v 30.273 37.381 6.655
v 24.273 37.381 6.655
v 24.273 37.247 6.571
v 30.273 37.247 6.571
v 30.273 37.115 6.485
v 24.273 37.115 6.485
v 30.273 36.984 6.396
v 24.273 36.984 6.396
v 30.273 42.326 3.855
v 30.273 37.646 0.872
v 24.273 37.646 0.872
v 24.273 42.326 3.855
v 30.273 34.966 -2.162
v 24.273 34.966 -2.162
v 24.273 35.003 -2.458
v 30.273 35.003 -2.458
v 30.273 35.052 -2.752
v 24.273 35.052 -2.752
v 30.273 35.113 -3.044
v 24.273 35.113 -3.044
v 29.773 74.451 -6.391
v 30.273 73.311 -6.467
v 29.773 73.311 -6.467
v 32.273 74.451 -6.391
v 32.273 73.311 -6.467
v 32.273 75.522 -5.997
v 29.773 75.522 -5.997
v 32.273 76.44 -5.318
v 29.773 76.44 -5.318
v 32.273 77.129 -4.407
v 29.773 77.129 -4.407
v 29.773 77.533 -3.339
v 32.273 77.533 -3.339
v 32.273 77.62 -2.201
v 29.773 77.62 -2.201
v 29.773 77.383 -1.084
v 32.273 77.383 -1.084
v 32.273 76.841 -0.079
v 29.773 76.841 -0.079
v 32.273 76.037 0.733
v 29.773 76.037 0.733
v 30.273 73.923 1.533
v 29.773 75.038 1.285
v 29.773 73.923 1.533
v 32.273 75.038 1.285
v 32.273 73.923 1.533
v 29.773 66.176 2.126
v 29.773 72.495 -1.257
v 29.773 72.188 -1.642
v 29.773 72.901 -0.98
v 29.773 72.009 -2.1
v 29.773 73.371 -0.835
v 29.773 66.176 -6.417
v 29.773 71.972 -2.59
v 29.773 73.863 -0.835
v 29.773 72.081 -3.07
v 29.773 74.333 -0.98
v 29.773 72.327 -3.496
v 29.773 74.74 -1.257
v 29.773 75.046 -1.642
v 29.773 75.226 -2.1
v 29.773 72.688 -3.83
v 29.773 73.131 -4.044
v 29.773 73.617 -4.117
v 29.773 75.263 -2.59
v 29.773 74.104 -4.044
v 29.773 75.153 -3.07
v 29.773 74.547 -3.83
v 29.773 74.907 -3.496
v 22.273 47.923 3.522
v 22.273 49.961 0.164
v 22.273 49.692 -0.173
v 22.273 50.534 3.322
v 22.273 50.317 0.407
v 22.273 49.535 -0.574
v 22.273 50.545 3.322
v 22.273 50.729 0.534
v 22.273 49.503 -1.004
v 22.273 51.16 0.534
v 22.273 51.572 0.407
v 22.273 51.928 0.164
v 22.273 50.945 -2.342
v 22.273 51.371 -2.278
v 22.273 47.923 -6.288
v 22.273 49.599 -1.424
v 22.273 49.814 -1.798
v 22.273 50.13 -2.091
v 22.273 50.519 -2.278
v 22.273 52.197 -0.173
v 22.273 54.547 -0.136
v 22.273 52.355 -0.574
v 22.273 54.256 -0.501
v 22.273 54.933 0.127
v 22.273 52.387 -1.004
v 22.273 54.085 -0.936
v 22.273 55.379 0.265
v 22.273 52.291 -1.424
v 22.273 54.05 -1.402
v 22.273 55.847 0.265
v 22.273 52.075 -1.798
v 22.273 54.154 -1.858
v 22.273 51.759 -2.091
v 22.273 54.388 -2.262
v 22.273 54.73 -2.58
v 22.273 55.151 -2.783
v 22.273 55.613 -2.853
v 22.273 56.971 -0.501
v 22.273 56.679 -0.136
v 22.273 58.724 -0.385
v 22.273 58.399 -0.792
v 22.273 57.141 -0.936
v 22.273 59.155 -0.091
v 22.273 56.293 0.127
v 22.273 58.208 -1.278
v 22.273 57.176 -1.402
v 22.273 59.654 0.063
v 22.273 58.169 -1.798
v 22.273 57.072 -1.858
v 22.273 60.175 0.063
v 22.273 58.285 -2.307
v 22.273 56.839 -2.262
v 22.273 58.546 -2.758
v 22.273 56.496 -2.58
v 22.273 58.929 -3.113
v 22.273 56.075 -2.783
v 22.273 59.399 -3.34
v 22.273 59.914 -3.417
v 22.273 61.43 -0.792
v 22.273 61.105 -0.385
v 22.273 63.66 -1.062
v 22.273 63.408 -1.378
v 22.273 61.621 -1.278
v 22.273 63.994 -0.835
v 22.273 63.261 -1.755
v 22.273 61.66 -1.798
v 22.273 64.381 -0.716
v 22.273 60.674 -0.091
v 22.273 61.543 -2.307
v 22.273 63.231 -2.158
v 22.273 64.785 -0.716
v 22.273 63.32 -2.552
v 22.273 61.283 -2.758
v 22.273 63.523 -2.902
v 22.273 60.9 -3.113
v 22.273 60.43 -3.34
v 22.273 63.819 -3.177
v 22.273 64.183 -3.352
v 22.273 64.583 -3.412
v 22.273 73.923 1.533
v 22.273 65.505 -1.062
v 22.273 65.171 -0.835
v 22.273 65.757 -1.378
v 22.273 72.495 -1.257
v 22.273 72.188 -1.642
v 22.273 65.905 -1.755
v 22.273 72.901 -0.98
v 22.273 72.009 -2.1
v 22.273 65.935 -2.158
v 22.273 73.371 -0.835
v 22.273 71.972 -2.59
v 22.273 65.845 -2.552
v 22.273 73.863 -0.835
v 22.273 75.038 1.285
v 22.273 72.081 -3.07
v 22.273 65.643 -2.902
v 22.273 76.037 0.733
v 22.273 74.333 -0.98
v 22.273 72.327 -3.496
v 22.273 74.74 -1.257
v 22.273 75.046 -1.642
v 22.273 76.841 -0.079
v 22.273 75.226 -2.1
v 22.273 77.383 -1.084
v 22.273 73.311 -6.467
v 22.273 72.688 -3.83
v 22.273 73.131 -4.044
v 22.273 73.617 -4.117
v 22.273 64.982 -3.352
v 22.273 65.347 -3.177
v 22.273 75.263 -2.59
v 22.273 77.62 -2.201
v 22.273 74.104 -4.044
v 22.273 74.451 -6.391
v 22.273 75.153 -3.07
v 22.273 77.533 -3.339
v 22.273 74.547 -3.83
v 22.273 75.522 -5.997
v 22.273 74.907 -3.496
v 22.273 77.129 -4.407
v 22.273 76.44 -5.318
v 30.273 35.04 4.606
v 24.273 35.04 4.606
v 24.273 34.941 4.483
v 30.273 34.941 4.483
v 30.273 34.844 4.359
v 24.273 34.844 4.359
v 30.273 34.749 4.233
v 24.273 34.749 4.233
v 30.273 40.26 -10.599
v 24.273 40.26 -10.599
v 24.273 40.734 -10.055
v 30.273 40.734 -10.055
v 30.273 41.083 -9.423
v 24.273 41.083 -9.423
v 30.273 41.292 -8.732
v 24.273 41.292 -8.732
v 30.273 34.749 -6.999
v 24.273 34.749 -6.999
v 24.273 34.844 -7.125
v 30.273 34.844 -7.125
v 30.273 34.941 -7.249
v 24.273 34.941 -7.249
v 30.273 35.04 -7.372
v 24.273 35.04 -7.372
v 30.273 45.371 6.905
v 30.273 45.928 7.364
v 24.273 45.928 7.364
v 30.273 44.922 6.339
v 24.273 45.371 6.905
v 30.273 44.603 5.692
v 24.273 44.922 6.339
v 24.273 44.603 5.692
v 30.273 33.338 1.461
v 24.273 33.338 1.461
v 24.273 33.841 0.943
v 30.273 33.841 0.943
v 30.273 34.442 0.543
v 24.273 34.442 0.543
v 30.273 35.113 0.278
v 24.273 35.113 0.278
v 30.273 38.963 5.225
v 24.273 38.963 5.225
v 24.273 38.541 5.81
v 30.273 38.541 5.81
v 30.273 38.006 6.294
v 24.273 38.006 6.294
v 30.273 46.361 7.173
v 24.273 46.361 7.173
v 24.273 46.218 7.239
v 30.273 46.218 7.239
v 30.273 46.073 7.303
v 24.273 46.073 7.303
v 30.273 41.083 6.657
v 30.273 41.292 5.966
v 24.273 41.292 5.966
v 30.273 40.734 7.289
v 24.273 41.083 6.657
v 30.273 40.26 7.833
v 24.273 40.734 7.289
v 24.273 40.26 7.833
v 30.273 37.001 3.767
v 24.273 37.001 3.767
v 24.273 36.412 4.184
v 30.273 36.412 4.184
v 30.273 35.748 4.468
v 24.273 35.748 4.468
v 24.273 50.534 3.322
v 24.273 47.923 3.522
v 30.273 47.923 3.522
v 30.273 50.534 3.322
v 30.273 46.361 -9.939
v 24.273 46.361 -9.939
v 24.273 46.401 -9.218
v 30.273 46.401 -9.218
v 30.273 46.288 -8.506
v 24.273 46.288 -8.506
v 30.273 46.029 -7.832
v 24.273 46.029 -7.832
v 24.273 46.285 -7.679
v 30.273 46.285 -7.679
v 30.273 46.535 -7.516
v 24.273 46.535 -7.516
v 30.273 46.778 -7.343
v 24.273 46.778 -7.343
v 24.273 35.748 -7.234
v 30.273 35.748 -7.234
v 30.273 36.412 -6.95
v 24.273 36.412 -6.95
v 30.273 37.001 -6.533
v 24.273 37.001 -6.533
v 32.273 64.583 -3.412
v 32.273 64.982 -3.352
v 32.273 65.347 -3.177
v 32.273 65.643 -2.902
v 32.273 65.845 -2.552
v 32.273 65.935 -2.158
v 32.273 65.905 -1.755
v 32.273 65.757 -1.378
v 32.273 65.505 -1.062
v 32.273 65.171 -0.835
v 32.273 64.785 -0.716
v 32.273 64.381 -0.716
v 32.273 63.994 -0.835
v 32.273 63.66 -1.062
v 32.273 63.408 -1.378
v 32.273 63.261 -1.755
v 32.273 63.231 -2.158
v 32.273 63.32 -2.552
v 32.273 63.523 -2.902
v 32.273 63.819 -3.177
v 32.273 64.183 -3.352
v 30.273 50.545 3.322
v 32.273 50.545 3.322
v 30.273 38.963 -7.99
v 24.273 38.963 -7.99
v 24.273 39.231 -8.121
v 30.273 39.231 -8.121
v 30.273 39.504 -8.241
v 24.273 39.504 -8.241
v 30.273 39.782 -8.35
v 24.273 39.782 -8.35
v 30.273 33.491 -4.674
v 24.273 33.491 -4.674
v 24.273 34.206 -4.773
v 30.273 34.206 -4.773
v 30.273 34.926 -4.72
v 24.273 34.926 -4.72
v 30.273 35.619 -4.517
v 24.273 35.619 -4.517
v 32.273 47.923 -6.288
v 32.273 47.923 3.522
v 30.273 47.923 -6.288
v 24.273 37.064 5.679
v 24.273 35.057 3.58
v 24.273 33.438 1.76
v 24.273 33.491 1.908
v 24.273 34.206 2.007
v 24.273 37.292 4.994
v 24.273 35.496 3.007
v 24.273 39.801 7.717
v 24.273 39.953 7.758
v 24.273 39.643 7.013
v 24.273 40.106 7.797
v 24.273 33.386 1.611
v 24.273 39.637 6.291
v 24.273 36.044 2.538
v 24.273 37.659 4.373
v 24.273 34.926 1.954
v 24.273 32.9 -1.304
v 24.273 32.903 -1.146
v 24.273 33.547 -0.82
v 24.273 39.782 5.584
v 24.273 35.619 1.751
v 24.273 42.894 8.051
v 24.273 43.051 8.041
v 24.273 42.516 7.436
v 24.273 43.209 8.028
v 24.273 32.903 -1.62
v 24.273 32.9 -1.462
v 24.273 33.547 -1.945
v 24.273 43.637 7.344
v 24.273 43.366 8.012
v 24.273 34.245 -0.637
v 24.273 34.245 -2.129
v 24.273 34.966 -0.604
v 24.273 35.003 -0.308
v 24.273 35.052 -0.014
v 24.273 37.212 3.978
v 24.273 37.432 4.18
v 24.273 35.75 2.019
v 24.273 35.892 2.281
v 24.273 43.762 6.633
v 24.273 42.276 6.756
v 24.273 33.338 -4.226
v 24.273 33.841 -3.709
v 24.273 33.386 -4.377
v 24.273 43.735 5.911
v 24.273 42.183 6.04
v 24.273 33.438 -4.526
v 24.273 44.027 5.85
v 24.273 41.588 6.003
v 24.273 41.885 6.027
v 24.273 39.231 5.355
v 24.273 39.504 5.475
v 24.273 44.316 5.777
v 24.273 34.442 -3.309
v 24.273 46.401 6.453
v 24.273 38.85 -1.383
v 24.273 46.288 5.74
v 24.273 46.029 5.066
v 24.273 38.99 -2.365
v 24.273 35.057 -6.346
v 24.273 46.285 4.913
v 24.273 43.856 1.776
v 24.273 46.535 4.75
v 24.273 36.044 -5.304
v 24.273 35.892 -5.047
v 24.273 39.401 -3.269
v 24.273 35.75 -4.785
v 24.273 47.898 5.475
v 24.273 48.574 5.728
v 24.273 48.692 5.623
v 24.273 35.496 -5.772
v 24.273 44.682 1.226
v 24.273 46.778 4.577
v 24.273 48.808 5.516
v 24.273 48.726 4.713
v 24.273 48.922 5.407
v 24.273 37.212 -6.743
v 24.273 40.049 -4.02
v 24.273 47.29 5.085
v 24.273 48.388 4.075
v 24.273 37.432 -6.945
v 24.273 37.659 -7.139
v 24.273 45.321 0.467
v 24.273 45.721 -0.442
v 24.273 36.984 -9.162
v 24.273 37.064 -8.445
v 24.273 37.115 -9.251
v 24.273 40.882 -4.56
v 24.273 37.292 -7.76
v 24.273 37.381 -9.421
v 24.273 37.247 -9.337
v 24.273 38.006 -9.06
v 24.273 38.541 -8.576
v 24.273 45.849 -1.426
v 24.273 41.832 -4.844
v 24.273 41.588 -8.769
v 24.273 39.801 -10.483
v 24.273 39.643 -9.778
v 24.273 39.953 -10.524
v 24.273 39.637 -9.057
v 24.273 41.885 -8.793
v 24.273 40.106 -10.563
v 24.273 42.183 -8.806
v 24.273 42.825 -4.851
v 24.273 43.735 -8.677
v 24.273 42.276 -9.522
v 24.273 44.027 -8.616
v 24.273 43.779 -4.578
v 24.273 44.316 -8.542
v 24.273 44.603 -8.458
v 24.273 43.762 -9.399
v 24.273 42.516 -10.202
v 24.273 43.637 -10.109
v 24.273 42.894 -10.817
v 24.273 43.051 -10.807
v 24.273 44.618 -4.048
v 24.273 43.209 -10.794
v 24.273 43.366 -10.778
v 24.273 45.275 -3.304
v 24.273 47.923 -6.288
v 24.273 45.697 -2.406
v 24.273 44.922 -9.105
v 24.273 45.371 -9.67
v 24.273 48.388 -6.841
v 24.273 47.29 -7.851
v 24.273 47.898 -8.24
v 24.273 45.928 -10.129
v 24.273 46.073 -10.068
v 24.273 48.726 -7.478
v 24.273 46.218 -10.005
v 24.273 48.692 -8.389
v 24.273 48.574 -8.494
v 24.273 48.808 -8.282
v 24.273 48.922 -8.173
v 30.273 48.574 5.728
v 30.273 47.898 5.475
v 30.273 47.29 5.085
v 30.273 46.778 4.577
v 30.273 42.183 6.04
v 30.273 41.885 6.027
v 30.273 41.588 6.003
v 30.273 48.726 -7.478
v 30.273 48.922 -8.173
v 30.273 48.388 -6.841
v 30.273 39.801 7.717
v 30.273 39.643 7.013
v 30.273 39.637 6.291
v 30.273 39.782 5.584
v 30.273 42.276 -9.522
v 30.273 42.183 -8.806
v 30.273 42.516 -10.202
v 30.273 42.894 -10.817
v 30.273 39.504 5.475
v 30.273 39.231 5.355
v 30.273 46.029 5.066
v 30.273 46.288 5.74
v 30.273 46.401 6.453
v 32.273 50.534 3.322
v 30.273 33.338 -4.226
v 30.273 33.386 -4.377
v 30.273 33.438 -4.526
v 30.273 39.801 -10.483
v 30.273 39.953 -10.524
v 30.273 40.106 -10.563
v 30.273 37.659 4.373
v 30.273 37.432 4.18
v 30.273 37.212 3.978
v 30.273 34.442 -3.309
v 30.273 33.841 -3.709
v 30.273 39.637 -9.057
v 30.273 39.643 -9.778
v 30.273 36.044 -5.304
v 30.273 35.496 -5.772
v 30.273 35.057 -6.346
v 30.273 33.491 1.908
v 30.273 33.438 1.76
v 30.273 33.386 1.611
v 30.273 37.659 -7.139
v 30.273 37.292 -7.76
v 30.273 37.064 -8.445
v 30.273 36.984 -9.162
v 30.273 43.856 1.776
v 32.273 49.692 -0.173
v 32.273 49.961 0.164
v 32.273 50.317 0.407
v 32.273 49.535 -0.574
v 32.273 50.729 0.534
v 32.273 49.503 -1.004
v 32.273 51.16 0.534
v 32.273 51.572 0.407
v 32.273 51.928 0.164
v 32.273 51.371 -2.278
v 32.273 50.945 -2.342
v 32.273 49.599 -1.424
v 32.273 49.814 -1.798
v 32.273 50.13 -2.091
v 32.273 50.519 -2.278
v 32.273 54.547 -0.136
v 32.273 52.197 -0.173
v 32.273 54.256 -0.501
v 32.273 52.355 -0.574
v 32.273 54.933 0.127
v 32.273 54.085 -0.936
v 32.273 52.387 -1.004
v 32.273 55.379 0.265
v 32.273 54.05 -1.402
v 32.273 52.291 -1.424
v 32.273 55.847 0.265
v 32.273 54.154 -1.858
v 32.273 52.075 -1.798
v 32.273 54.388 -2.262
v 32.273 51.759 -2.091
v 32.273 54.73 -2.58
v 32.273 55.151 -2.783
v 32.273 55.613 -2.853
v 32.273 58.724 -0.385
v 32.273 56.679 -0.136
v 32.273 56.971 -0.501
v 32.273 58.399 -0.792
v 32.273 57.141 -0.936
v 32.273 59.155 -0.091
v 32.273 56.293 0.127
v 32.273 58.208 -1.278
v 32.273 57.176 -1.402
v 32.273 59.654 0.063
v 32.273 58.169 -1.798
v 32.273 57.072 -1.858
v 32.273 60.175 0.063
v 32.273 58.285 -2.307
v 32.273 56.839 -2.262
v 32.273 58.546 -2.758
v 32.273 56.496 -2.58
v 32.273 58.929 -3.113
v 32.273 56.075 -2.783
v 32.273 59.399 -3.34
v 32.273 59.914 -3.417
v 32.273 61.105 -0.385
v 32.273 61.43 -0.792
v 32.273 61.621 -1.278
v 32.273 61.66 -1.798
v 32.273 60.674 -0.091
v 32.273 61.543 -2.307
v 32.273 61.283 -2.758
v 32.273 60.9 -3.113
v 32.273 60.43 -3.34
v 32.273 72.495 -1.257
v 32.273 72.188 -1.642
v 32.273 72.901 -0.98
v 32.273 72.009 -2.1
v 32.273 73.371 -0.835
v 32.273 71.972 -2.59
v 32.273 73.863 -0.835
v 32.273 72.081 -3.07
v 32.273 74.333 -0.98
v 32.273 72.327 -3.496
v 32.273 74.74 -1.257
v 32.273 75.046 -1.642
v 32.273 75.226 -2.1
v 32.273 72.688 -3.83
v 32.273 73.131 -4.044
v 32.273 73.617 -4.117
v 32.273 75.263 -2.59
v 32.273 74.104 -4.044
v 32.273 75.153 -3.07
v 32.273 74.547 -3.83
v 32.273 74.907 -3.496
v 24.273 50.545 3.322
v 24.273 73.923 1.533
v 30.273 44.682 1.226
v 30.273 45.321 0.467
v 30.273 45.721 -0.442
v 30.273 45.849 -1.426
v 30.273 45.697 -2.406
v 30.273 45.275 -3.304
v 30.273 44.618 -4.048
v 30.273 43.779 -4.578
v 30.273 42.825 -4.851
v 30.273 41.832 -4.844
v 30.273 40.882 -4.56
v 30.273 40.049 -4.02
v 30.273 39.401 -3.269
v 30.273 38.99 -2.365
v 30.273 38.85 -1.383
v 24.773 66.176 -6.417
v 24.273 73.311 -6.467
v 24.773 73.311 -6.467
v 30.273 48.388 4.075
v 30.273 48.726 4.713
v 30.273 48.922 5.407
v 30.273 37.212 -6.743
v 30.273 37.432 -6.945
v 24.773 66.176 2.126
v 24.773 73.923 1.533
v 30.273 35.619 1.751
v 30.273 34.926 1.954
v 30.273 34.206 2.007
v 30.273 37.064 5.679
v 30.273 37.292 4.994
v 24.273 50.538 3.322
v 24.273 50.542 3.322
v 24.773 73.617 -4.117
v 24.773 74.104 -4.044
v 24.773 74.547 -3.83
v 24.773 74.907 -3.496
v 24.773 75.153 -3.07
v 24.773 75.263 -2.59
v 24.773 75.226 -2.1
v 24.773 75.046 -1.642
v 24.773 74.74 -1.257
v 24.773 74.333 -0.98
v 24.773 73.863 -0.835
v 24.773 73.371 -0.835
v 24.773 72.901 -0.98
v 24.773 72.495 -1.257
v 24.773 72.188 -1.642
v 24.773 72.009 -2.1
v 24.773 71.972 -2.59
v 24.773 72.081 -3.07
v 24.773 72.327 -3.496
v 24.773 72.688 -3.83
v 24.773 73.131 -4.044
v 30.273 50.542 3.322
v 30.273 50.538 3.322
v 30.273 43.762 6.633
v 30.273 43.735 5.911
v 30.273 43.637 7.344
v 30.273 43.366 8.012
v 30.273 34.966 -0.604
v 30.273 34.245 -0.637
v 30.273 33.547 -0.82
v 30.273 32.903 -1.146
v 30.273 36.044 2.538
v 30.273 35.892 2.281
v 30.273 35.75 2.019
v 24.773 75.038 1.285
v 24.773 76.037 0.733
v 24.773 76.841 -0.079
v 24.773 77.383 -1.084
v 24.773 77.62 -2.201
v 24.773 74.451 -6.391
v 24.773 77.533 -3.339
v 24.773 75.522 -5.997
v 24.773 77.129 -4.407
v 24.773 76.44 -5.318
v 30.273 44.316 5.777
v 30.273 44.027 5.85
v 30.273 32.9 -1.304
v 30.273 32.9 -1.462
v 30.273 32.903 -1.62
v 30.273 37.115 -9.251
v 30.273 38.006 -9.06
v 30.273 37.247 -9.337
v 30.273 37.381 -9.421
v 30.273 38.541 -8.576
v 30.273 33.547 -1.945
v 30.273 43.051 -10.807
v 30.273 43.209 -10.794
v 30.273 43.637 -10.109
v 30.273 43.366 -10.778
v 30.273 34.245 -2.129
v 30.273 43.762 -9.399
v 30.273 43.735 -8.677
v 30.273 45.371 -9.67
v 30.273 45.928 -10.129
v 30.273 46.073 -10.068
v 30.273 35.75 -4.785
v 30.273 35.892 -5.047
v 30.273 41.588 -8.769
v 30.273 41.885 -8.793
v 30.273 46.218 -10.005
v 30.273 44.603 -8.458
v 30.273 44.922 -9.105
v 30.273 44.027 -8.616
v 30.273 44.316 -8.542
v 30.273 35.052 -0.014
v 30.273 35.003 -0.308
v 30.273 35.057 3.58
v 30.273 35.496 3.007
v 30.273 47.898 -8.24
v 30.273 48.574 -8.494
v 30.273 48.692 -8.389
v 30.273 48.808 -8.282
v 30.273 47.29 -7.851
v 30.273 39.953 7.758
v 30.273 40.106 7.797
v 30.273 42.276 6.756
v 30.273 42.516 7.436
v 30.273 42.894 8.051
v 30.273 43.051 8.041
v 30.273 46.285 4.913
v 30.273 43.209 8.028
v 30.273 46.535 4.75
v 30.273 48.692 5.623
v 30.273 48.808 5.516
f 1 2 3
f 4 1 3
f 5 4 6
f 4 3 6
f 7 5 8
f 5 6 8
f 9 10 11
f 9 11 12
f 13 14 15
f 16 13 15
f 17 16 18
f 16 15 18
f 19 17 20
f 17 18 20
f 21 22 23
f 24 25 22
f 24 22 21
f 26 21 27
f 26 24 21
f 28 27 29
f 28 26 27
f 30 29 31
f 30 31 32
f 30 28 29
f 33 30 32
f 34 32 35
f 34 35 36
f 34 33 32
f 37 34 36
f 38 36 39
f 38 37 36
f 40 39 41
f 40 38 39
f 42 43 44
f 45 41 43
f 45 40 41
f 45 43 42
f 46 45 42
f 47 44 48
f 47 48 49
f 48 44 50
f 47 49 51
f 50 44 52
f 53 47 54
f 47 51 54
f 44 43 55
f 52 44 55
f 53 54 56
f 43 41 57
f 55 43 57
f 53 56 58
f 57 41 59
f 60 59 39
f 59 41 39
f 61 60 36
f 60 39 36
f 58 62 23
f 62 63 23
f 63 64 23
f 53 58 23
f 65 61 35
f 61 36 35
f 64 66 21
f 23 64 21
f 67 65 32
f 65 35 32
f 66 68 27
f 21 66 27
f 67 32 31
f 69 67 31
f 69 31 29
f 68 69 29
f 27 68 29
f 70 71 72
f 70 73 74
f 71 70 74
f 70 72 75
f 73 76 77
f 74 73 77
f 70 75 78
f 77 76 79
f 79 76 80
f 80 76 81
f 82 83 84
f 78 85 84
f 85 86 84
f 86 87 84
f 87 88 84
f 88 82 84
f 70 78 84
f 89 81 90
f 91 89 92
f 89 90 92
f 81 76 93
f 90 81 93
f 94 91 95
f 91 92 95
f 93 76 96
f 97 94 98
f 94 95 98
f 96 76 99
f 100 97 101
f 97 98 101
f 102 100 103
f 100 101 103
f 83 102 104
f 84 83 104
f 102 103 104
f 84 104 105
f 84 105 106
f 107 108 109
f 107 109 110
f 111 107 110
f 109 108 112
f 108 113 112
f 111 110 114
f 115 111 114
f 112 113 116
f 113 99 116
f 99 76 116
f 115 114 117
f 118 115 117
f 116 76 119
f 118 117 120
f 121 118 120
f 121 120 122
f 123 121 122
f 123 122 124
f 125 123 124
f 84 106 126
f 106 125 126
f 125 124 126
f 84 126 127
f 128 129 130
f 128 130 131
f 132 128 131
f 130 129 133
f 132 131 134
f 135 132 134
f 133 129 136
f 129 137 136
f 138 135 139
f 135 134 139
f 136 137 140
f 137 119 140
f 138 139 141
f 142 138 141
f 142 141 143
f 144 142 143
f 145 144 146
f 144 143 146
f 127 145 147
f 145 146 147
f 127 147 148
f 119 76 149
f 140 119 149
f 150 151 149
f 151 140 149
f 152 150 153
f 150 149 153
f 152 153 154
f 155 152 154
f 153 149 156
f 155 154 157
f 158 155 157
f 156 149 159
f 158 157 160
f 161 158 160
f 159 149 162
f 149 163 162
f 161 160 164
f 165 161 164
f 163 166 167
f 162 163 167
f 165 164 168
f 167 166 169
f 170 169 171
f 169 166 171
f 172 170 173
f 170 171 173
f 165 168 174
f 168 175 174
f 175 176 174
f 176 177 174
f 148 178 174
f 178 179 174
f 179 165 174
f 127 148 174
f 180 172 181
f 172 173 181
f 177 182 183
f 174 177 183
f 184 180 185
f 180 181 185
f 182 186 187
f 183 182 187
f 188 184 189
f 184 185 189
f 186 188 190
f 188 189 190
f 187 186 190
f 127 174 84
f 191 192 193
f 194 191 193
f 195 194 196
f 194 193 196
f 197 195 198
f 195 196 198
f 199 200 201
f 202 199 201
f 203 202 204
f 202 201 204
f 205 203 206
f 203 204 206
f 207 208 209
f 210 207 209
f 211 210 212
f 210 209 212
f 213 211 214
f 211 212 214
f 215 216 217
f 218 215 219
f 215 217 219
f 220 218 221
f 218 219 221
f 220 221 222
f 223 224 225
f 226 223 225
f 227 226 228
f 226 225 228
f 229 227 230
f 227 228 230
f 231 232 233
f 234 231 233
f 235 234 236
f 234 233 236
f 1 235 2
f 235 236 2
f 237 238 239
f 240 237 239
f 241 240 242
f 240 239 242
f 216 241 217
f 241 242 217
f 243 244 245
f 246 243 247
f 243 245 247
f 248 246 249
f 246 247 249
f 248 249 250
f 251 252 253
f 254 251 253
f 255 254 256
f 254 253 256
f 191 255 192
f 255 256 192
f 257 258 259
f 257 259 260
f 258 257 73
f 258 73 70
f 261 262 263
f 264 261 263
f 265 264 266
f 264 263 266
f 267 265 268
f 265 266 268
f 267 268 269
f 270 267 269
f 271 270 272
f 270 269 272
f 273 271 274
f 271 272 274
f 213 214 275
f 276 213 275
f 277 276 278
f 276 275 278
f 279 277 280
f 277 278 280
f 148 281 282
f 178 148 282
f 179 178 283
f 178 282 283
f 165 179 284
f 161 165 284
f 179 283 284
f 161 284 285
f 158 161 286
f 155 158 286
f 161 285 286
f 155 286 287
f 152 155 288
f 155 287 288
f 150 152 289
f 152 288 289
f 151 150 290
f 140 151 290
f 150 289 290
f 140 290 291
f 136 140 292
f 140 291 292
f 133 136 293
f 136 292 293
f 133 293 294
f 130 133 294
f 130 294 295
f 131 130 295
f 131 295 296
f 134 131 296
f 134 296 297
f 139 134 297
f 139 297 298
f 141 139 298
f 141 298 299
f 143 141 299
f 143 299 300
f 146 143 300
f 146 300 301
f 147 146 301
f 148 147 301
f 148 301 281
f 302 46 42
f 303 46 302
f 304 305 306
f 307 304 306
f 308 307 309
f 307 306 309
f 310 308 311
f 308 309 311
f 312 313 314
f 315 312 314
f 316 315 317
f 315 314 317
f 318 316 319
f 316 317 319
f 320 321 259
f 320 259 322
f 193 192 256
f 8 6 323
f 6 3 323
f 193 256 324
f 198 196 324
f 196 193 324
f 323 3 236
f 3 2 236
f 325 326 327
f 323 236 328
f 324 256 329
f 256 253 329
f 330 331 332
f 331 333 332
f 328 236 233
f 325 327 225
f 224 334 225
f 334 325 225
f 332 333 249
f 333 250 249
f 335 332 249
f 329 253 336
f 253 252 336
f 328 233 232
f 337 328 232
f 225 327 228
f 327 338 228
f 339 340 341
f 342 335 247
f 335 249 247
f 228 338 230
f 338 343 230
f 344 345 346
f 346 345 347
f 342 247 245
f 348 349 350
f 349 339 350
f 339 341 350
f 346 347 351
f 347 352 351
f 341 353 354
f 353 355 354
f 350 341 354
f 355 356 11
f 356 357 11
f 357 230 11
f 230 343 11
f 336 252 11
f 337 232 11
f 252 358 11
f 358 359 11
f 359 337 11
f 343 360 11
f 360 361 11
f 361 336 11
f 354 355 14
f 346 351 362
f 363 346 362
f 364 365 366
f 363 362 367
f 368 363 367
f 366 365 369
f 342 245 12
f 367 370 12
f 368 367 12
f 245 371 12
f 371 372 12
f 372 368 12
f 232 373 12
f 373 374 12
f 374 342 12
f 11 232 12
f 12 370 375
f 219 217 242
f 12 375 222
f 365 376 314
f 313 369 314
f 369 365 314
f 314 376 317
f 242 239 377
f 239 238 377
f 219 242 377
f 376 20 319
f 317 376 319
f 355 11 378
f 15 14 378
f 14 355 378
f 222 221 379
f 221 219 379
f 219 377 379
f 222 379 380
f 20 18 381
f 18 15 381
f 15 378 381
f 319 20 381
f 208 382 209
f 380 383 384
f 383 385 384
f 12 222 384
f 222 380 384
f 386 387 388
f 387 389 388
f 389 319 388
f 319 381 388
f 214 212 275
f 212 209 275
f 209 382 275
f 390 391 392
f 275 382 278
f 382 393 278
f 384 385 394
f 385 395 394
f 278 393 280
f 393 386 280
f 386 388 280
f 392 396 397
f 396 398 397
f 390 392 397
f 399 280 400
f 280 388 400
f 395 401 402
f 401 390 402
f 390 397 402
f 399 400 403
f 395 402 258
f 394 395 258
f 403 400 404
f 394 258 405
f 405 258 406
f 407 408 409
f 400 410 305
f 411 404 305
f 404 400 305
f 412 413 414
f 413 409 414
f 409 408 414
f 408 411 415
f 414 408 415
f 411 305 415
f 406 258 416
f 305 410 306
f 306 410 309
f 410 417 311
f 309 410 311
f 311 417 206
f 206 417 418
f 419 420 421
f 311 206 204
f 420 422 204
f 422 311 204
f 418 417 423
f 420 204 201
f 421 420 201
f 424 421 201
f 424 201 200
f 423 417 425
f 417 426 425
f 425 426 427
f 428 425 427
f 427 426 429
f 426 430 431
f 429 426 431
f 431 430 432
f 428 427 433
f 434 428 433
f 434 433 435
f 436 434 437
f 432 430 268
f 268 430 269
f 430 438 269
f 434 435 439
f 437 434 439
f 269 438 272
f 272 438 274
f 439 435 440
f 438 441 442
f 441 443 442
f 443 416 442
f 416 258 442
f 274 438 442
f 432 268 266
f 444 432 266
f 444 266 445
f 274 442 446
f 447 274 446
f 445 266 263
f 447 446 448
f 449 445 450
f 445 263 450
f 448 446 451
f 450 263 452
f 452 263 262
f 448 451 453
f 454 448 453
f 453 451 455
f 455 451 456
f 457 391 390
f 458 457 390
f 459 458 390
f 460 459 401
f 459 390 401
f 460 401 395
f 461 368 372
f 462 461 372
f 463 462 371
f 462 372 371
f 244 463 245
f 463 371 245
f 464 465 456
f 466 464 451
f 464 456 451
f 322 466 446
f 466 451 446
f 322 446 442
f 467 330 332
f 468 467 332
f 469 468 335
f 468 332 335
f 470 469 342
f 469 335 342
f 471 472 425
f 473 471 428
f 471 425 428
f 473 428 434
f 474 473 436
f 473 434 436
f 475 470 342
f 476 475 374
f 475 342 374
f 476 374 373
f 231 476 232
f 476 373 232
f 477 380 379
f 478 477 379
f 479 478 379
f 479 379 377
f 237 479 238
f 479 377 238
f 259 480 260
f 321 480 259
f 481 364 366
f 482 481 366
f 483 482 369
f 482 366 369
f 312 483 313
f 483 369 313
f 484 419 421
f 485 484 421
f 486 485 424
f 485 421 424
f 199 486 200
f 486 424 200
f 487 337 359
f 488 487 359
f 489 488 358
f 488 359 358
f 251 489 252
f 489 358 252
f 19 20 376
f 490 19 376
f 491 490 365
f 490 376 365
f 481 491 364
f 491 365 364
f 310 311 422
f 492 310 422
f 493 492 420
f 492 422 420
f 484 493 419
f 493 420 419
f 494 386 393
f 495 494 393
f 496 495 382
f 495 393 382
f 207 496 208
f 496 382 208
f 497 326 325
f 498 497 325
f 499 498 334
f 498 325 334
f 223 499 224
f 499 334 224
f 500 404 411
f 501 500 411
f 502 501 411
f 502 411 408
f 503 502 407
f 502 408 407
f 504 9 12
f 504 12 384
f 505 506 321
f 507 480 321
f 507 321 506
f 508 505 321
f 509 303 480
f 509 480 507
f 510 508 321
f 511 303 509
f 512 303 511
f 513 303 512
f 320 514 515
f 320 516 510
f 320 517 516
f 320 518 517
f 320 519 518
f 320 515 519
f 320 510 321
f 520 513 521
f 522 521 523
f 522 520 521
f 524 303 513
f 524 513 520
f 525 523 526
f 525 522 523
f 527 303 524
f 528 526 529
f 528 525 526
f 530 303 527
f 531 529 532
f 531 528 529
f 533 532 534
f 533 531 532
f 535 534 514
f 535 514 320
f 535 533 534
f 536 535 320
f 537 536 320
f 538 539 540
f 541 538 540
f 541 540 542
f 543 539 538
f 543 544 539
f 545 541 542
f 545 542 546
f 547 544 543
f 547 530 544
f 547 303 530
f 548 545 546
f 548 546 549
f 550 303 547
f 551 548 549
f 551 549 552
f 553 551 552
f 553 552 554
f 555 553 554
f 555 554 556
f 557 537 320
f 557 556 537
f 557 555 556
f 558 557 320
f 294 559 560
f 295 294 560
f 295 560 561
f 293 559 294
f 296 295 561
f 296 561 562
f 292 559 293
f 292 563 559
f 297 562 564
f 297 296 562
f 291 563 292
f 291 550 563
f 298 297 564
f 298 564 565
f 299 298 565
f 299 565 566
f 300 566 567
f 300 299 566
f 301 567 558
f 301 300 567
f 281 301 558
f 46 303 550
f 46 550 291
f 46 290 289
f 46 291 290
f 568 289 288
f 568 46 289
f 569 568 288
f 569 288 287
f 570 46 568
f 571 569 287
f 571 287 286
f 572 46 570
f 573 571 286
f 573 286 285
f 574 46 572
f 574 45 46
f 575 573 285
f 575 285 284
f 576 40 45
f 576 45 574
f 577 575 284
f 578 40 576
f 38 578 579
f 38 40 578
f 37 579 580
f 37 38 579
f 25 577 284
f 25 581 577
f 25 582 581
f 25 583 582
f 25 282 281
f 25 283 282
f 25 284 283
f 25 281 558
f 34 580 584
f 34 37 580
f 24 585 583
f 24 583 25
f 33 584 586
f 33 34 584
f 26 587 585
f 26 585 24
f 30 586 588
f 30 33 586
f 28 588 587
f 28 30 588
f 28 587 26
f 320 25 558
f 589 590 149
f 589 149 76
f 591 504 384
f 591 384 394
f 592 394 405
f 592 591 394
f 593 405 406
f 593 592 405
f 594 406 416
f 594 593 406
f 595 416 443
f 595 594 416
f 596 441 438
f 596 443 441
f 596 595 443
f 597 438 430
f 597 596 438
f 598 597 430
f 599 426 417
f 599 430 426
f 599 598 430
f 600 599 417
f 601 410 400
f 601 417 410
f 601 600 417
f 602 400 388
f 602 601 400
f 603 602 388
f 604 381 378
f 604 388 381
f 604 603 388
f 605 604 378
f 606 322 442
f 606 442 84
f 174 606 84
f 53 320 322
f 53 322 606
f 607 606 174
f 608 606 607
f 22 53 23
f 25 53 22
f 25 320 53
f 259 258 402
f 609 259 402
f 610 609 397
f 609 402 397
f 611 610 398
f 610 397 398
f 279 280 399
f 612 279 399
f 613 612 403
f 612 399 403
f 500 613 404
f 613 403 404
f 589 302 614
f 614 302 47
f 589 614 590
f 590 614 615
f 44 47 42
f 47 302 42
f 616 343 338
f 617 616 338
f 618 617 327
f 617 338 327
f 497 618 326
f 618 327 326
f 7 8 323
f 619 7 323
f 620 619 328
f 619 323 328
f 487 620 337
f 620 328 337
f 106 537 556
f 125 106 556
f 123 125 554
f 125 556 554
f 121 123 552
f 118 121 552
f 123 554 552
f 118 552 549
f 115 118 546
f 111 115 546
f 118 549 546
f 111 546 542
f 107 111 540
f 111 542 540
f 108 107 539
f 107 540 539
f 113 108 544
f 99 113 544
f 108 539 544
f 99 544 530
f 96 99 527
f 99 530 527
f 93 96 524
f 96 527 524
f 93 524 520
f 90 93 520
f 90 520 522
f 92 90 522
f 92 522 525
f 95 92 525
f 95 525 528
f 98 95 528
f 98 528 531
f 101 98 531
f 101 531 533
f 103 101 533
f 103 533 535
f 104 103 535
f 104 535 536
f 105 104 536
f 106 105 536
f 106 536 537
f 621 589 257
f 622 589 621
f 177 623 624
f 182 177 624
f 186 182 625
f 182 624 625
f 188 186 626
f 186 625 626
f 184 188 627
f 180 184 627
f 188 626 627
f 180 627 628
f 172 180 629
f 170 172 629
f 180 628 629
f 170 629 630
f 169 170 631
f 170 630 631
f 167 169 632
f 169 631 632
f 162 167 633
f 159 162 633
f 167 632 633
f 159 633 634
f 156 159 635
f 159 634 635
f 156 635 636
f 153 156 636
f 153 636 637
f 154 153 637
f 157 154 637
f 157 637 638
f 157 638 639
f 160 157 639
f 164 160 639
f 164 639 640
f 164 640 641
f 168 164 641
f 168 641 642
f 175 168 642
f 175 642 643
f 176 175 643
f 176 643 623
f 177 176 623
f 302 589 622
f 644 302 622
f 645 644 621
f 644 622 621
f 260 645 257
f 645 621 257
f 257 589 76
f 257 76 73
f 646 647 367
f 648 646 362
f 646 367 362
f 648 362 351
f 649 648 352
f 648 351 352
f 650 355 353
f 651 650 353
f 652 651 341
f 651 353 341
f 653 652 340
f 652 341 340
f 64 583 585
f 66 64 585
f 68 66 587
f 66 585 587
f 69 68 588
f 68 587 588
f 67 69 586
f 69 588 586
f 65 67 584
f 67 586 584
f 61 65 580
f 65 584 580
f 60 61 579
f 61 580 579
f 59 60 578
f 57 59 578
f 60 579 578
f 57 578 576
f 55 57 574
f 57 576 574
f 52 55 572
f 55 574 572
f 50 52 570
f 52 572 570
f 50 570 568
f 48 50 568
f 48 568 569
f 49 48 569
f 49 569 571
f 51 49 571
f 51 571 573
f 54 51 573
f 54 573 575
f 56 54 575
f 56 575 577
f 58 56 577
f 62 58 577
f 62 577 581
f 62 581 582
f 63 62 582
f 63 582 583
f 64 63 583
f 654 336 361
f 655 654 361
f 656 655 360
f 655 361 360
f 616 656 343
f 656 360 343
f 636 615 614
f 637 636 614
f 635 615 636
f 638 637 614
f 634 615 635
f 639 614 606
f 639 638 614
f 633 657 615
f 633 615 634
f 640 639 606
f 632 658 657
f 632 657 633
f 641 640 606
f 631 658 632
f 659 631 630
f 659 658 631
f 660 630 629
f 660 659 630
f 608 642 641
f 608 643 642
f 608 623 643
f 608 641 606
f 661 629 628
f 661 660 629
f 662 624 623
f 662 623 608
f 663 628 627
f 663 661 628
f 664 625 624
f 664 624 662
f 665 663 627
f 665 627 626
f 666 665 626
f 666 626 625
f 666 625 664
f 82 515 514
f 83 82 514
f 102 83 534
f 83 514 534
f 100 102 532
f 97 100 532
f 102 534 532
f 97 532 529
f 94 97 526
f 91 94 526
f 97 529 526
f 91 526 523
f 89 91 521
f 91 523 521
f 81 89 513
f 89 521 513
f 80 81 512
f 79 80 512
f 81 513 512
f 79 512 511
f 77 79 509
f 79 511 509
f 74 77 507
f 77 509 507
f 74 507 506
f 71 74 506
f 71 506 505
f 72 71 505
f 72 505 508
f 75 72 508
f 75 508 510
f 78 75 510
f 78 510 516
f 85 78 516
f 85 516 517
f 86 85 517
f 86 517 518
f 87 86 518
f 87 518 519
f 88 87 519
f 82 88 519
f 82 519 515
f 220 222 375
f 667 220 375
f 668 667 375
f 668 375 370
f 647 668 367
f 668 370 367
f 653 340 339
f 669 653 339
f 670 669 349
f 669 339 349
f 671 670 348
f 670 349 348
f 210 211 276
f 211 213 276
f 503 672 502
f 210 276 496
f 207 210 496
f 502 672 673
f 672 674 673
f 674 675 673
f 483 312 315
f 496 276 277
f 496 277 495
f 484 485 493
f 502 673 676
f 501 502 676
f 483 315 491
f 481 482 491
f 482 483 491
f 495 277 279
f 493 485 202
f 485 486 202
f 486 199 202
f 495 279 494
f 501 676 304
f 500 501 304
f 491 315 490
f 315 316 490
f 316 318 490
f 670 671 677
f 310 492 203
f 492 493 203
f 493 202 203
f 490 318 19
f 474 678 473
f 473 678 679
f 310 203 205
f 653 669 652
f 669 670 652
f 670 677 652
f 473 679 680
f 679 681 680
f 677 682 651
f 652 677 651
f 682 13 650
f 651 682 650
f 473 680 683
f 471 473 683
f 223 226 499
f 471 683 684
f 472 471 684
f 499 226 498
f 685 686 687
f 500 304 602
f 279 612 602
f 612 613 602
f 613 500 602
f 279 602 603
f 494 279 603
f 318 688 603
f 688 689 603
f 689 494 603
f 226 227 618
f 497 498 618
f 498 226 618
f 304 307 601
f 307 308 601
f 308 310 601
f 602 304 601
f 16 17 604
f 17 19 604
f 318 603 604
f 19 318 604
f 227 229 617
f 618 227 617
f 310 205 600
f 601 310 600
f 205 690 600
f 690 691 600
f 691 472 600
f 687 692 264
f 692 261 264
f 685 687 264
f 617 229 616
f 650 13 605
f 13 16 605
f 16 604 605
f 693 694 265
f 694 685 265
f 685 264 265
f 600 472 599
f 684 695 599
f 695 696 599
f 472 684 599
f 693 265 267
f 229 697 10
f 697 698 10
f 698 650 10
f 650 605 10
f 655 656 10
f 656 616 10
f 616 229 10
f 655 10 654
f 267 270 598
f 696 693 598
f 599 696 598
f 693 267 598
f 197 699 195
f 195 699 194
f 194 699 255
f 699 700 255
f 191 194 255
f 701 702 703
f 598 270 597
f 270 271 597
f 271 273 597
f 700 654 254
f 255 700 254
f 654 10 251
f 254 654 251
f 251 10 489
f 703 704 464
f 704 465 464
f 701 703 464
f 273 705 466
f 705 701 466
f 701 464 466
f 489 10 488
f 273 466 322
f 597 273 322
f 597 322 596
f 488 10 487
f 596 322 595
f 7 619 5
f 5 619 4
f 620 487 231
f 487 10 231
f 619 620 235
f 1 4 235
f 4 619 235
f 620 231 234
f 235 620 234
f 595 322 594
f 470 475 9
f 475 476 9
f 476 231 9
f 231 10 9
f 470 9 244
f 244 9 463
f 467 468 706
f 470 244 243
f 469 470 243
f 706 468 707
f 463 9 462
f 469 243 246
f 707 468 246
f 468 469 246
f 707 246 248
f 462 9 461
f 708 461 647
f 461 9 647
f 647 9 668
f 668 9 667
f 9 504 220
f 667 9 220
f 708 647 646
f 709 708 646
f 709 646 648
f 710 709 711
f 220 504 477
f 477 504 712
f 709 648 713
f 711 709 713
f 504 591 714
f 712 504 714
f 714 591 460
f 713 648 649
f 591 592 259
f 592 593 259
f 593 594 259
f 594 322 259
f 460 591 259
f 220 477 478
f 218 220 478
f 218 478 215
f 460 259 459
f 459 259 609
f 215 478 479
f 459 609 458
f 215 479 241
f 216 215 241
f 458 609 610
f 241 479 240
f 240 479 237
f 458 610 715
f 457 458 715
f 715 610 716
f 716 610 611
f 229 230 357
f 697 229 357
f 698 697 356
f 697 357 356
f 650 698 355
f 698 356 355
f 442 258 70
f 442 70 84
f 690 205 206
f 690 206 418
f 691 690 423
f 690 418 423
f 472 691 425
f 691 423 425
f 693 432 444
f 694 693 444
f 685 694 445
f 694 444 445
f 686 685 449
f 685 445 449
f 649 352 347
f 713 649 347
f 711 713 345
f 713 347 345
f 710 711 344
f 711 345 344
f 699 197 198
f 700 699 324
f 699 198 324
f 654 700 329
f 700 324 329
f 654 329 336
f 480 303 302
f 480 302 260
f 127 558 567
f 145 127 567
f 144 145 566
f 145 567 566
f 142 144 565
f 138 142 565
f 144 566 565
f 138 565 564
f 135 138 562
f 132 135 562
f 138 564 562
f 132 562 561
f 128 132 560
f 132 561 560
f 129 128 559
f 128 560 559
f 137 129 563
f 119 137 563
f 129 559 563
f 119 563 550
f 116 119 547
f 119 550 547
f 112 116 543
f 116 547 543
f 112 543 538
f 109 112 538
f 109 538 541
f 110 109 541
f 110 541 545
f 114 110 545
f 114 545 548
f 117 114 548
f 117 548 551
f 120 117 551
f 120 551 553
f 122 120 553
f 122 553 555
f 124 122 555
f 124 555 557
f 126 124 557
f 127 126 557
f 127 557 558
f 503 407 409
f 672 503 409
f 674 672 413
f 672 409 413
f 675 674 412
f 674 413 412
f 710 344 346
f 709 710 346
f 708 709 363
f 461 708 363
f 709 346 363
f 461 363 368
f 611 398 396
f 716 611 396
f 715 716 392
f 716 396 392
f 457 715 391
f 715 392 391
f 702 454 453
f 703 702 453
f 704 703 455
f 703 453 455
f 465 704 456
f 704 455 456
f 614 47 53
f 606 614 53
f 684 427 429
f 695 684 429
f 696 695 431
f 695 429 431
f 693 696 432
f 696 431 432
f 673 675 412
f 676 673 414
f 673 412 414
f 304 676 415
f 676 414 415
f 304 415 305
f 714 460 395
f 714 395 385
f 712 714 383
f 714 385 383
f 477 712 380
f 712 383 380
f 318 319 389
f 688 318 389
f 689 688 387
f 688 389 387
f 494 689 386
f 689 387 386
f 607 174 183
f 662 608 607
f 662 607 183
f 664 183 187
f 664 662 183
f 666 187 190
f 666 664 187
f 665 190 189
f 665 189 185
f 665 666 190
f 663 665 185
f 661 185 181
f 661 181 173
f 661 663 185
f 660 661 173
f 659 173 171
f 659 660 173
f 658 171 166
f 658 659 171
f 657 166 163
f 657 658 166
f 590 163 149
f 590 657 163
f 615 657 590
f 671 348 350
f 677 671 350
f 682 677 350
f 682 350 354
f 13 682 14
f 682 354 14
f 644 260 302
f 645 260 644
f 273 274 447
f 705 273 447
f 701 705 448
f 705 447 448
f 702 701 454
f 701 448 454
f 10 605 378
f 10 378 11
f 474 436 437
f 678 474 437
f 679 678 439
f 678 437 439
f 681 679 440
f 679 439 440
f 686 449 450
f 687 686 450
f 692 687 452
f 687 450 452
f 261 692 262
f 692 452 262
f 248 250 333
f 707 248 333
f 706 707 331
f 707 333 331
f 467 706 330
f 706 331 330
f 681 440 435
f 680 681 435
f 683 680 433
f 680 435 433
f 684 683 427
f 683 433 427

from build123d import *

# Parameters (mm, degrees)
SPUR_START             = -32.726855157
SPUR_GEAR_GB_OUTLINE_R = 22.5
SPUR_GEAR_GB_DEPTH     = 75
SKETCH_2_R             = 56.152658256
CUT_EXTRUDE_1_DEPTH    = 45
EXTRUDE_1_DEPTH        = 30
EXTRUDE_START          = -30
SKETCH_5_R             = 22.5
EXTRUDE_2_DEPTH        = 30
SCALE_1_SCALE          = 0.2
CUT_EXTRUDE_3_DEPTH    = 10
EXTRUDE_3_DEPTH        = 5
SKETCH_8_R             = 1.65
CUT_EXTRUDE_4_DEPTH    = 10
SKETCH_9_W             = 18.454746183
SKETCH_9_H             = 13.449677925
CUT_EXTRUDE_5_DEPTH    = 2.5
SKETCH_10_R            = 1.446114005
SKETCH_10_R_2          = 1.567494057
SKETCH_10_R_3          = 1.749983797
SKETCH_10_R_4          = 1.35600832
CUT_EXTRUDE_6_DEPTH    = 80.014451116


# Read off the part's stored shape, not the designer's step: spur gear_gb
with BuildPart() as part:
    # spur gear_gb outline → spur gear_gb (new body)
    with BuildSketch(Plane.YZ.offset(SPUR_START)):
        with BuildLine():
            ThreePointArc((32.862431273, 33.858374177), (32.001554259, 34.671025411), (31.120587981, 35.461853886))
            ThreePointArc((31.120587981, 35.461853886), (26.170323532, 33.302671085), (22.140322459, 29.707357493))
            ThreePointArc((22.140322459, 29.707357493), (20.304903422, 30.987038971), (18.395725829, 32.153824573))
            ThreePointArc((18.395725829, 32.153824573), (20.069385125, 37.288613083), (20.058208562, 42.689267077))
            ThreePointArc((20.058208562, 42.689267077), (18.980108815, 43.178360316), (17.890094133, 43.64029024))
            ThreePointArc((17.890094133, 43.64029024), (13.909134176, 39.99074968), (11.264886092, 35.281700885))
            ThreePointArc((11.264886092, 35.281700885), (9.113403224, 35.896086104), (6.928815473, 36.379743093))
            ThreePointArc((6.928815473, 36.379743093), (6.844528189, 41.779750883), (5.080367717, 46.884153523))
            ThreePointArc((5.080367717, 46.884153523), (3.901874073, 46.996687926), (2.720930993, 47.079662024))
            ThreePointArc((2.720930993, 47.079662024), (0.14067431, 42.335248053), (-0.831275476, 37.022762562))
            ThreePointArc((-0.831275476, 37.022762562), (-3.065675621, 36.90527335), (-5.28893955, 36.653389986))
            ThreePointArc((-5.28893955, 36.653389986), (-7.12203958, 41.733442422), (-10.448009799, 45.988452479))
            ThreePointArc((-10.448009799, 45.988452479), (-11.599189267, 45.712233197), (-12.74308724, 45.407259939))
            ThreePointArc((-12.74308724, 45.407259939), (-13.643029801, 40.082103428), (-12.837355447, 34.741871474))
            ThreePointArc((-12.837355447, 34.741871474), (-14.912540945, 33.90523961), (-16.933555907, 32.945111364))
            ThreePointArc((-16.933555907, 32.945111364), (-20.316823851, 37.154705941), (-24.844183336, 40.099227051))
            ThreePointArc((-24.844183336, 40.099227051), (-25.843300471, 39.464186729), (-26.826194241, 38.804314699))
            ThreePointArc((-26.826194241, 38.804314699), (-25.948299939, 33.475478984), (-23.452308764, 28.686197563))
            ThreePointArc((-23.452308764, 28.686197563), (-25.143401065, 27.221085091), (-26.74315873, 25.656756756))
            ThreePointArc((-26.74315873, 25.656756756), (-31.309965009, 28.539718582), (-36.548104111, 29.854666195))
            ThreePointArc((-36.548104111, 29.854666195), (-37.286889069, 28.929621306), (-38.002266845, 27.986357877))
            ThreePointArc((-38.002266845, 27.986357877), (-35.44166915, 23.231304993), (-31.525840525, 19.51196706))
            ThreePointArc((-31.525840525, 19.51196706), (-32.64958354, 17.577141651), (-33.654725342, 15.578132475))
            ThreePointArc((-33.654725342, 15.578132475), (-38.910185635, 16.822047902), (-44.291470704, 16.364927041))
            ThreePointArc((-44.291470704, 16.364927041), (-44.68986467, 15.250120552), (-45.060204171, 14.125682952))
            ThreePointArc((-45.060204171, 14.125682952), (-41.094383574, 10.459696662), (-36.183058293, 8.213350193))
            ThreePointArc((-36.183058293, 8.213350193), (-36.617677028, 6.018480201), (-36.919280256, 3.801413847))
            ThreePointArc((-36.919280256, 3.801413847), (-42.293883893, 3.271485337), (-47.235169193, 1.091832139))
            ThreePointArc((-47.235169193, 1.091832139), (-47.25, -0.091929368), (-47.235169193, -1.275690876))
            ThreePointArc((-47.235169193, -1.275690876), (-42.293883893, -3.455344074), (-36.919280256, -3.985272584))
            ThreePointArc((-36.919280256, -3.985272584), (-36.617677028, -6.202338938), (-36.183058293, -8.39720893))
            ThreePointArc((-36.183058293, -8.39720893), (-41.094383574, -10.643555399), (-45.060204171, -14.309541689))
            ThreePointArc((-45.060204171, -14.309541689), (-44.68986467, -15.433979288), (-44.291470704, -16.548785777))
            ThreePointArc((-44.291470704, -16.548785777), (-38.910185635, -17.005906639), (-33.654725342, -15.761991212))
            ThreePointArc((-33.654725342, -15.761991212), (-32.64958354, -17.761000388), (-31.525840525, -19.695825796))
            ThreePointArc((-31.525840525, -19.695825796), (-35.44166915, -23.41516373), (-38.002266845, -28.170216613))
            ThreePointArc((-38.002266845, -28.170216613), (-37.286889069, -29.113480043), (-36.548104111, -30.038524932))
            ThreePointArc((-36.548104111, -30.038524932), (-31.309965009, -28.723577319), (-26.74315873, -25.840615493))
            ThreePointArc((-26.74315873, -25.840615493), (-25.143401065, -27.404943828), (-23.452308764, -28.870056299))
            ThreePointArc((-23.452308764, -28.870056299), (-25.948299939, -33.65933772), (-26.826194241, -38.988173435))
            ThreePointArc((-26.826194241, -38.988173435), (-25.843300471, -39.648045466), (-24.844183336, -40.283085788))
            ThreePointArc((-24.844183336, -40.283085788), (-20.316823851, -37.338564677), (-16.933555907, -33.128970101))
            ThreePointArc((-16.933555907, -33.128970101), (-14.912540945, -34.089098347), (-12.837355447, -34.925730211))
            ThreePointArc((-12.837355447, -34.925730211), (-13.643029801, -40.265962164), (-12.74308724, -45.591118675))
            ThreePointArc((-12.74308724, -45.591118675), (-11.599189267, -45.896091934), (-10.448009799, -46.172311216))
            ThreePointArc((-10.448009799, -46.172311216), (-7.12203958, -41.917301159), (-5.28893955, -36.837248723))
            ThreePointArc((-5.28893955, -36.837248723), (-3.065675621, -37.089132087), (-0.831275476, -37.206621299))
            ThreePointArc((-0.831275476, -37.206621299), (0.14067431, -42.51910679), (2.720930993, -47.263520761))
            ThreePointArc((2.720930993, -47.263520761), (3.901874073, -47.180546663), (5.080367717, -47.06801226))
            ThreePointArc((5.080367717, -47.06801226), (6.844528189, -41.96360962), (6.928815473, -36.56360183))
            ThreePointArc((6.928815473, -36.56360183), (9.113403224, -36.079944841), (11.264886092, -35.465559622))
            ThreePointArc((11.264886092, -35.465559622), (13.909134176, -40.174608417), (17.890094133, -43.824148977))
            ThreePointArc((17.890094133, -43.824148977), (18.980108815, -43.362219053), (20.058208562, -42.873125814))
            ThreePointArc((20.058208562, -42.873125814), (20.069385125, -37.47247182), (18.395725829, -32.33768331))
            ThreePointArc((18.395725829, -32.33768331), (20.304903422, -31.170897707), (22.140322459, -29.891216229))
            ThreePointArc((22.140322459, -29.891216229), (26.170323532, -33.486529822), (31.120587981, -35.645712623))
            ThreePointArc((31.120587981, -35.645712623), (32.001554259, -34.854884148), (32.862431273, -34.042232914))
            ThreePointArc((32.862431273, -34.042232914), (31.119412774, -28.930572226), (27.869173851, -24.617437006))
            ThreePointArc((27.869173851, -24.617437006), (29.296052271, -22.893962115), (30.616511345, -21.087657722))
            ThreePointArc((30.616511345, -21.087657722), (35.595552259, -23.179628097), (40.978683235, -23.614472179))
            ThreePointArc((40.978683235, -23.614472179), (41.555134745, -22.58044369), (42.105499643, -21.532297832))
            ThreePointArc((42.105499643, -21.532297832), (38.797169181, -17.2635582), (34.322564452, -14.239471396))
            ThreePointArc((34.322564452, -14.239471396), (35.112519281, -12.146072463), (35.774926162, -10.008886264))
            ThreePointArc((35.774926162, -10.008886264), (41.163450577, -10.370815972), (46.396102311, -9.034199232))
            ThreePointArc((46.396102311, -9.034199232), (46.605571586, -7.869023759), (46.785783792, -6.698966145))
            ThreePointArc((46.785783792, -6.698966145), (42.270650308, -3.735731746), (37.056572625, -2.328400087))
            ThreePointArc((37.056572625, -2.328400087), (37.124, -0.091929368), (37.056572625, 2.14454135))
            ThreePointArc((37.056572625, 2.14454135), (42.270650308, 3.551873009), (46.785783792, 6.515107408))
            ThreePointArc((46.785783792, 6.515107408), (46.605571586, 7.685165023), (46.396102311, 8.850340496))
            ThreePointArc((46.396102311, 8.850340496), (41.163450577, 10.186957235), (35.774926162, 9.825027527))
            ThreePointArc((35.774926162, 9.825027527), (35.112519281, 11.962213726), (34.322564452, 14.05561266))
            ThreePointArc((34.322564452, 14.05561266), (38.797169181, 17.079699464), (42.105499643, 21.348439095))
            ThreePointArc((42.105499643, 21.348439095), (41.555134745, 22.396584953), (40.978683235, 23.430613443))
            ThreePointArc((40.978683235, 23.430613443), (35.595552259, 22.99576936), (30.616511345, 20.903798985))
            ThreePointArc((30.616511345, 20.903798985), (29.296052271, 22.710103378), (27.869173851, 24.433578269))
            ThreePointArc((27.869173851, 24.433578269), (31.119412774, 28.746713489), (32.862431273, 33.858374177))
        make_face()
        with Locations((0, -0.091929368)):
            Circle(SPUR_GEAR_GB_OUTLINE_R, mode=Mode.SUBTRACT)
    extrude(amount=SPUR_GEAR_GB_DEPTH)

    # 草图2 → 切除-拉伸1 (cut)
    with BuildSketch(Plane.ZY.offset(32.726855157)):
        with Locations((-0.091929368, 0)):
            Circle(SKETCH_2_R)
    extrude(amount=-CUT_EXTRUDE_1_DEPTH, mode=Mode.SUBTRACT)

    # 草图4 → 凸台-拉伸1 (add)
    with BuildSketch(Plane(origin=(42.273144843, 0, 0), x_dir=(0, 0, -1), z_dir=(1, 0, 0))):
        with BuildLine():
            Line((-24.433578269, 27.869173851), (-23.430613443, 40.978683235))
            Line((-23.430613443, 40.978683235), (-14.487711984, 157.869173851))
            ThreePointArc((-14.487711984, 157.869173851), (7.042421291, 176.339040577), (25.512288016, 154.808907302))
            Line((25.512288016, 154.808907302), (24.617437006, 27.869173851))
            Line((24.617437006, 27.869173851), (-24.433578269, 27.869173851))
        make_face()
    extrude(amount=-EXTRUDE_1_DEPTH)

    # 草图5 → 凸台-拉伸2 (add)
    with BuildSketch(Plane(origin=(42.273144843, 0, 0), x_dir=(0, 0, -1), z_dir=(1, 0, 0)).offset(EXTRUDE_START)):
        with Locations((0.091929368, 0)):
            Circle(SKETCH_5_R)
    extrude(amount=EXTRUDE_2_DEPTH)


with BuildPart() as part_1:
    # 缩放比例1: scaled about (27.273144843, 52.936955481, -1.705643422)
    add(part.part.scale(SCALE_1_SCALE).moved(Location((21.818515874, 42.349564385, -1.364514738))))

    # 草图6 → 切除-拉伸3 (cut)
    with BuildSketch(Plane(origin=(30.273144843, 0, 0), x_dir=(0, 0, -1), z_dir=(1, 0, 0))):
        with BuildLine():
            Line((-0.872032296, 37.645512175), (-3.855195053, 42.325601914))
            Line((-3.855195053, 42.325601914), (-1.776224322, 43.856192956))
            ThreePointArc((-1.776224322, 43.856192956), (4.342900611, 44.217290275), (1.382900611, 38.849564385))
            Line((1.382900611, 38.849564385), (-0.872032296, 37.645512175))
        make_face()
    extrude(amount=-CUT_EXTRUDE_3_DEPTH, mode=Mode.SUBTRACT)

    # 草图7 → 凸台-拉伸3 (add, symmetric)
    with BuildSketch(Plane(origin=(27.273144843, 0, 0), x_dir=(0, 0, -1), z_dir=(1, 0, 0))):
        with BuildLine():
            Line((6.288002139, 47.923399155), (6.466972341, 73.311345845))
            ThreePointArc((6.466972341, 73.311345845), (2.772998996, 77.6173725), (-1.533027659, 73.923399155))
            Line((-1.533027659, 73.923399155), (-3.321607951, 50.545301032))
            Line((-3.321607951, 50.545301032), (-3.322451181, 50.53427937))
            Line((-3.322451181, 50.53427937), (-3.522200916, 47.923399155))
            Line((-3.522200916, 47.923399155), (6.288002139, 47.923399155))
        make_face()
    extrude(amount=EXTRUDE_3_DEPTH, both=True)

    # 草图8 → 切除-拉伸4 (cut)
    with BuildSketch(Plane(origin=(32.273144843, 0, 0), x_dir=(0, 0, -1), z_dir=(1, 0, 0))):
        with Locations((2.466972341, 73.6173725)):
            Circle(SKETCH_8_R)
    extrude(amount=-CUT_EXTRUDE_4_DEPTH, mode=Mode.SUBTRACT)

    # 草图9 → 切除-拉伸5 (cut, symmetric)
    with BuildSketch(Plane(origin=(27.273144843, 0, 0), x_dir=(0, 0, -1), z_dir=(1, 0, 0))):
        with Locations((1.880211444, 72.900415106)):
            Rectangle(SKETCH_9_W, SKETCH_9_H)
    extrude(amount=CUT_EXTRUDE_5_DEPTH, both=True, mode=Mode.SUBTRACT)

    # 草图10 → 切除-拉伸6 (cut, through all)
    with BuildSketch(Plane(origin=(32.273144843, 0, 0), x_dir=(0, 0, -1), z_dir=(1, 0, 0))):
        with Locations((0.89588905, 50.944816989)):
            Circle(SKETCH_10_R)
        with Locations((1.285013172, 55.613074907)):
            Circle(SKETCH_10_R_2)
        with Locations((1.667330314, 59.914483987)):
            Circle(SKETCH_10_R_3)
        with Locations((2.056454436, 64.582741905)):
            Circle(SKETCH_10_R_4)
    extrude(amount=-CUT_EXTRUDE_6_DEPTH, mode=Mode.SUBTRACT)


solid = part_1.part
